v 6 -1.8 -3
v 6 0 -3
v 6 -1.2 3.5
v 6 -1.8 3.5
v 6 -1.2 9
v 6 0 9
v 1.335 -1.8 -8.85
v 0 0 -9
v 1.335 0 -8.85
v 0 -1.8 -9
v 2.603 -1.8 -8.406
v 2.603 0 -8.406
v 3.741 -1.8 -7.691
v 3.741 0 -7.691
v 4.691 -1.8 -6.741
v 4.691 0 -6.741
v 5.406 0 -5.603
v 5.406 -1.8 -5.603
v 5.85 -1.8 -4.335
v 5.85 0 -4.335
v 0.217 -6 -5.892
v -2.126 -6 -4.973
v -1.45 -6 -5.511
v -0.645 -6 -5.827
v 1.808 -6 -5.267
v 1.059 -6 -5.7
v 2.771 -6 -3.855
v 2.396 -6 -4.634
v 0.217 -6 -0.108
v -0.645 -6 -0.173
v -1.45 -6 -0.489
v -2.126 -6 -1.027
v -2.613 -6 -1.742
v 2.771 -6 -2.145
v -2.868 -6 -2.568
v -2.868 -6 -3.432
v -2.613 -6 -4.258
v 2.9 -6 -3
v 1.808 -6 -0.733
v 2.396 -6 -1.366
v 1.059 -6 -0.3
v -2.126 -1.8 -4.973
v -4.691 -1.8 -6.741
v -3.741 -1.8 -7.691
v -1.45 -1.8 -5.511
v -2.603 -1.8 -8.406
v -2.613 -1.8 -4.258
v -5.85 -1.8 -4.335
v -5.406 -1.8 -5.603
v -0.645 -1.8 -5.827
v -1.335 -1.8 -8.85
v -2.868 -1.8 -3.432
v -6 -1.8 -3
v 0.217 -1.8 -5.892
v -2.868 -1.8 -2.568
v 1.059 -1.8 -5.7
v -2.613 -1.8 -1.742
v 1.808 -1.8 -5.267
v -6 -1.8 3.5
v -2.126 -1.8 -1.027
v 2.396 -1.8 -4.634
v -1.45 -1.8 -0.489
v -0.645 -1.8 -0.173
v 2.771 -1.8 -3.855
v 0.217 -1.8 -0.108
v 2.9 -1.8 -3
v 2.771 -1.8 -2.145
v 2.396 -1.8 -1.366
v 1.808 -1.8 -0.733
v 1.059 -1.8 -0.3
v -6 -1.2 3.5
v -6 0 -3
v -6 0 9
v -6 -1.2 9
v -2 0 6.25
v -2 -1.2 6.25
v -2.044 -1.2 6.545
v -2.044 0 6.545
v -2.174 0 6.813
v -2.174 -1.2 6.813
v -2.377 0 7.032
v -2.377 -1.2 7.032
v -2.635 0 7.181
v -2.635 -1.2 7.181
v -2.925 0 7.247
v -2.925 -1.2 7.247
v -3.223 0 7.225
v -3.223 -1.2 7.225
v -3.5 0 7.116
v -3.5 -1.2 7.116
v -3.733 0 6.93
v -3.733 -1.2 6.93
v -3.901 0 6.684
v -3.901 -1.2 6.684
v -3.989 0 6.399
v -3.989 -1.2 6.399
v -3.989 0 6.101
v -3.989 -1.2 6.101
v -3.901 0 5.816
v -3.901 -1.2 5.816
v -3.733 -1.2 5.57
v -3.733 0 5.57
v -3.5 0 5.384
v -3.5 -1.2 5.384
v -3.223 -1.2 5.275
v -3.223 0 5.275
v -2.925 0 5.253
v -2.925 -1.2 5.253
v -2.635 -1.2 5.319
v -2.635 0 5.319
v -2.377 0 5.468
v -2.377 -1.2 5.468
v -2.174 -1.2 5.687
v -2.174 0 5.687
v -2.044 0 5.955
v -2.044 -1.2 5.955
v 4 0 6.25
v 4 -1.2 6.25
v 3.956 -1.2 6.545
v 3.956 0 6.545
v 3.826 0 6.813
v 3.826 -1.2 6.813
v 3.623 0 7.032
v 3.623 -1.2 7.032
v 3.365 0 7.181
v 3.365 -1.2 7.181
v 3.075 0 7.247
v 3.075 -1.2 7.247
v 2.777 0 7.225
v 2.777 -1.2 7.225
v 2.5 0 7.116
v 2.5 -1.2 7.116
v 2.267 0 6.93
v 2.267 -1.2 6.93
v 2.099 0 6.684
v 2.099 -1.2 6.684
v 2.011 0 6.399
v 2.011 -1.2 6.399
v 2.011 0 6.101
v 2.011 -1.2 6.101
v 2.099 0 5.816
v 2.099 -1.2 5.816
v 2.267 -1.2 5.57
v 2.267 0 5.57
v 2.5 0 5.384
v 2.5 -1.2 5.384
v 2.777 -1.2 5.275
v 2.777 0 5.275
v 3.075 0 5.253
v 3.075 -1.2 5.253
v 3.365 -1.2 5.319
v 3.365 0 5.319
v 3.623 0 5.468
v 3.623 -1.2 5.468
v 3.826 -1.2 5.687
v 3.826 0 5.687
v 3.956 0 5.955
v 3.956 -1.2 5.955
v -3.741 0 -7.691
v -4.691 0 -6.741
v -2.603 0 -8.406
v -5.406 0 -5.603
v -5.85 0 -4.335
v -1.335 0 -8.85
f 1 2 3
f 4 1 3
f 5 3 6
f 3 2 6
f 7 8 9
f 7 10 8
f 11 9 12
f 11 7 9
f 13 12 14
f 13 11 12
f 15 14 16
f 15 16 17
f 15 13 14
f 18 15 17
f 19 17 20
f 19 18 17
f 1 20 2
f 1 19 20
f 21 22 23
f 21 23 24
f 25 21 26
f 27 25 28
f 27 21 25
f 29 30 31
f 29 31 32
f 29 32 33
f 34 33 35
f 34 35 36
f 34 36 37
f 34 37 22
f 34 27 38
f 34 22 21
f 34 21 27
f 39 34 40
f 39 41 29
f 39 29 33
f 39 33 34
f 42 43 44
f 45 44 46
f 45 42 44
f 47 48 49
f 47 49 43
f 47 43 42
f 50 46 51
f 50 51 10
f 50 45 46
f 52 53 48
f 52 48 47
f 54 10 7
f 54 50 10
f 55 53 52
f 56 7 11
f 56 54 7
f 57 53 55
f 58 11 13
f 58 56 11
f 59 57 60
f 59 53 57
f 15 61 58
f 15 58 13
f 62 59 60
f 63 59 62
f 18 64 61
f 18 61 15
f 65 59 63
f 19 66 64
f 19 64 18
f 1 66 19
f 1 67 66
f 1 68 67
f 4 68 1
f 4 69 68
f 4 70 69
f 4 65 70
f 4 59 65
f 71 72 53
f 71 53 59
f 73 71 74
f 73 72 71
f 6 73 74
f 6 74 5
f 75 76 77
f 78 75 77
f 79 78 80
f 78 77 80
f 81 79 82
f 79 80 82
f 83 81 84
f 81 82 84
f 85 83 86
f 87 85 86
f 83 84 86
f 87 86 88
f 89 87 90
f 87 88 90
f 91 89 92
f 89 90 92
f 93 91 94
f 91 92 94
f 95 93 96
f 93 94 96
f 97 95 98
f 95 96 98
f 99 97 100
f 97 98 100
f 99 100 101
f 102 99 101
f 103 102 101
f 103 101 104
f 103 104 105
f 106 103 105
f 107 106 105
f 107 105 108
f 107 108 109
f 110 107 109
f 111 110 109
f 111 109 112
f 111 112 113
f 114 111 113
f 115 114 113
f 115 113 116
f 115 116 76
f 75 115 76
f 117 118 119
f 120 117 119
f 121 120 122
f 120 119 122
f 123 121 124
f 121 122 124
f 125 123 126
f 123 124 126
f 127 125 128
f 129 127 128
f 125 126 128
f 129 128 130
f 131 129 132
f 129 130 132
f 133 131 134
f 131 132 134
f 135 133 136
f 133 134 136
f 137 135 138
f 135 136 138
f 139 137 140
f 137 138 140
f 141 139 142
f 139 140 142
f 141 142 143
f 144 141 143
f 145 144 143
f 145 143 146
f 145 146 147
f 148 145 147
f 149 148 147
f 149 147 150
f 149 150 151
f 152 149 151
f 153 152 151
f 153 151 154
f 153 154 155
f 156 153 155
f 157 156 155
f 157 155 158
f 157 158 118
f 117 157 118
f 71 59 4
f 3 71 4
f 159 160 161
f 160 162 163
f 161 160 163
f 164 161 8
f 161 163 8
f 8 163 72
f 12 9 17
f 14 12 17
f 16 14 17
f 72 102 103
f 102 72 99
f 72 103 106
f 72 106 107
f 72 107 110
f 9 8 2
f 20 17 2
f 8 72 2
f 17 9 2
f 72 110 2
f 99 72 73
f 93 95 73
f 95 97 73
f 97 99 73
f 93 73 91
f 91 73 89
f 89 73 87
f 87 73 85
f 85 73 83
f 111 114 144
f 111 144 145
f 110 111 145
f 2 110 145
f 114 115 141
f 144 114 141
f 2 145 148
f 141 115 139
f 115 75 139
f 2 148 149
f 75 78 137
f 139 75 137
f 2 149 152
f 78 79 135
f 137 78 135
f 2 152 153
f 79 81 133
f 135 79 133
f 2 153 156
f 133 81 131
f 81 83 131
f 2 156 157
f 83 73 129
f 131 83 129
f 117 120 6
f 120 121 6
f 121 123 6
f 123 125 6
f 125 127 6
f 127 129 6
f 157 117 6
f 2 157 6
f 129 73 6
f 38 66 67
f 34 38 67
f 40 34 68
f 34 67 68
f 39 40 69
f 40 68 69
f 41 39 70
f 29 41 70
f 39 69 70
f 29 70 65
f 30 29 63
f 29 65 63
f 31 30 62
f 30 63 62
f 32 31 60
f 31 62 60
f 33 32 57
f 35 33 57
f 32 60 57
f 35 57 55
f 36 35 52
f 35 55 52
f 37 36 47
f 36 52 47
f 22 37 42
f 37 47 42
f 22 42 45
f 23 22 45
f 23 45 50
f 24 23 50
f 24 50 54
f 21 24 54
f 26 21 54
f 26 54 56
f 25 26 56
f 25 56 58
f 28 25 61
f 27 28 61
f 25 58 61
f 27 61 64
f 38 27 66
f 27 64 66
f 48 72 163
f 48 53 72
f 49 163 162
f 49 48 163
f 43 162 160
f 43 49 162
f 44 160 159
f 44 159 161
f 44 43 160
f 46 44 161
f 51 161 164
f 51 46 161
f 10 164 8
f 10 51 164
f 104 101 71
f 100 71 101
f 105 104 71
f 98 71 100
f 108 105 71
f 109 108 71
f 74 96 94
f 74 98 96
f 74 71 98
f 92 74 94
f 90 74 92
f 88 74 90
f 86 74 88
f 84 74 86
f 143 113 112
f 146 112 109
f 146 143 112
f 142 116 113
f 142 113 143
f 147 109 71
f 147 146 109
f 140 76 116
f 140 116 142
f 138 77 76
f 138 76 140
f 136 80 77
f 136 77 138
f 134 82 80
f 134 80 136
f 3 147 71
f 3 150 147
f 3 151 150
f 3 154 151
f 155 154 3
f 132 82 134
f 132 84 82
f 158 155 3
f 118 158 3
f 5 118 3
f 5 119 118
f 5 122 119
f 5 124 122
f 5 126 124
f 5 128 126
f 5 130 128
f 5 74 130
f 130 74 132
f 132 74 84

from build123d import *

# Parameters (mm, degrees)
F0_W     = 12
F0_H     = 18
F1_DEPTH = 1.8
F2_R     = 5.99999
F3_W     = 12
F3_H     = 5.5
F4_DEPTH = 0.6
F5_R     = 2.9
F6_DEPTH = 4.2
F7_R     = 1
F8_DEPTH = 25


# Not quite as in the source:
# - a fillet or chamfer is up to 0.001 mm smaller than in the source, because OpenCascade refuses the exact size


with BuildPart() as f1:
    # F0 (on Front) → F1 (new body)
    with BuildSketch(Plane.XZ):
        Rectangle(F0_W, F0_H)
    extrude(amount=F1_DEPTH)

    # F2 (radius 6 in the source; OpenCascade refuses exactly that, so slightly less here)
    f2_edges = [f1.edges().sort_by_distance(p)[0] for p in [
        (6, -0.9, -9),
        (-6, -0.9, -9),
    ]]
    fillet(f2_edges, radius=F2_R)

    # F3 (on face) → F4 (cut)
    with BuildSketch(Plane.XZ.offset(1.8)):
        with Locations((0, 6.25)):
            Rectangle(F3_W, F3_H)
    extrude(amount=-F4_DEPTH, mode=Mode.SUBTRACT)

    # F5 (on face) → F6 (join)
    with BuildSketch(Plane.XZ.offset(1.8)):
        with Locations((0, -3)):
            Circle(F5_R)
    extrude(amount=F6_DEPTH)

    # F7 (on face) → F8 (cut)
    with BuildSketch(Plane.XZ.offset(1.2)):
        with Locations((-3, 6.25)):
            Circle(F7_R)
        with Locations((3, 6.25)):
            Circle(F7_R)
    extrude(amount=-F8_DEPTH, mode=Mode.SUBTRACT)


solid = f1.part
